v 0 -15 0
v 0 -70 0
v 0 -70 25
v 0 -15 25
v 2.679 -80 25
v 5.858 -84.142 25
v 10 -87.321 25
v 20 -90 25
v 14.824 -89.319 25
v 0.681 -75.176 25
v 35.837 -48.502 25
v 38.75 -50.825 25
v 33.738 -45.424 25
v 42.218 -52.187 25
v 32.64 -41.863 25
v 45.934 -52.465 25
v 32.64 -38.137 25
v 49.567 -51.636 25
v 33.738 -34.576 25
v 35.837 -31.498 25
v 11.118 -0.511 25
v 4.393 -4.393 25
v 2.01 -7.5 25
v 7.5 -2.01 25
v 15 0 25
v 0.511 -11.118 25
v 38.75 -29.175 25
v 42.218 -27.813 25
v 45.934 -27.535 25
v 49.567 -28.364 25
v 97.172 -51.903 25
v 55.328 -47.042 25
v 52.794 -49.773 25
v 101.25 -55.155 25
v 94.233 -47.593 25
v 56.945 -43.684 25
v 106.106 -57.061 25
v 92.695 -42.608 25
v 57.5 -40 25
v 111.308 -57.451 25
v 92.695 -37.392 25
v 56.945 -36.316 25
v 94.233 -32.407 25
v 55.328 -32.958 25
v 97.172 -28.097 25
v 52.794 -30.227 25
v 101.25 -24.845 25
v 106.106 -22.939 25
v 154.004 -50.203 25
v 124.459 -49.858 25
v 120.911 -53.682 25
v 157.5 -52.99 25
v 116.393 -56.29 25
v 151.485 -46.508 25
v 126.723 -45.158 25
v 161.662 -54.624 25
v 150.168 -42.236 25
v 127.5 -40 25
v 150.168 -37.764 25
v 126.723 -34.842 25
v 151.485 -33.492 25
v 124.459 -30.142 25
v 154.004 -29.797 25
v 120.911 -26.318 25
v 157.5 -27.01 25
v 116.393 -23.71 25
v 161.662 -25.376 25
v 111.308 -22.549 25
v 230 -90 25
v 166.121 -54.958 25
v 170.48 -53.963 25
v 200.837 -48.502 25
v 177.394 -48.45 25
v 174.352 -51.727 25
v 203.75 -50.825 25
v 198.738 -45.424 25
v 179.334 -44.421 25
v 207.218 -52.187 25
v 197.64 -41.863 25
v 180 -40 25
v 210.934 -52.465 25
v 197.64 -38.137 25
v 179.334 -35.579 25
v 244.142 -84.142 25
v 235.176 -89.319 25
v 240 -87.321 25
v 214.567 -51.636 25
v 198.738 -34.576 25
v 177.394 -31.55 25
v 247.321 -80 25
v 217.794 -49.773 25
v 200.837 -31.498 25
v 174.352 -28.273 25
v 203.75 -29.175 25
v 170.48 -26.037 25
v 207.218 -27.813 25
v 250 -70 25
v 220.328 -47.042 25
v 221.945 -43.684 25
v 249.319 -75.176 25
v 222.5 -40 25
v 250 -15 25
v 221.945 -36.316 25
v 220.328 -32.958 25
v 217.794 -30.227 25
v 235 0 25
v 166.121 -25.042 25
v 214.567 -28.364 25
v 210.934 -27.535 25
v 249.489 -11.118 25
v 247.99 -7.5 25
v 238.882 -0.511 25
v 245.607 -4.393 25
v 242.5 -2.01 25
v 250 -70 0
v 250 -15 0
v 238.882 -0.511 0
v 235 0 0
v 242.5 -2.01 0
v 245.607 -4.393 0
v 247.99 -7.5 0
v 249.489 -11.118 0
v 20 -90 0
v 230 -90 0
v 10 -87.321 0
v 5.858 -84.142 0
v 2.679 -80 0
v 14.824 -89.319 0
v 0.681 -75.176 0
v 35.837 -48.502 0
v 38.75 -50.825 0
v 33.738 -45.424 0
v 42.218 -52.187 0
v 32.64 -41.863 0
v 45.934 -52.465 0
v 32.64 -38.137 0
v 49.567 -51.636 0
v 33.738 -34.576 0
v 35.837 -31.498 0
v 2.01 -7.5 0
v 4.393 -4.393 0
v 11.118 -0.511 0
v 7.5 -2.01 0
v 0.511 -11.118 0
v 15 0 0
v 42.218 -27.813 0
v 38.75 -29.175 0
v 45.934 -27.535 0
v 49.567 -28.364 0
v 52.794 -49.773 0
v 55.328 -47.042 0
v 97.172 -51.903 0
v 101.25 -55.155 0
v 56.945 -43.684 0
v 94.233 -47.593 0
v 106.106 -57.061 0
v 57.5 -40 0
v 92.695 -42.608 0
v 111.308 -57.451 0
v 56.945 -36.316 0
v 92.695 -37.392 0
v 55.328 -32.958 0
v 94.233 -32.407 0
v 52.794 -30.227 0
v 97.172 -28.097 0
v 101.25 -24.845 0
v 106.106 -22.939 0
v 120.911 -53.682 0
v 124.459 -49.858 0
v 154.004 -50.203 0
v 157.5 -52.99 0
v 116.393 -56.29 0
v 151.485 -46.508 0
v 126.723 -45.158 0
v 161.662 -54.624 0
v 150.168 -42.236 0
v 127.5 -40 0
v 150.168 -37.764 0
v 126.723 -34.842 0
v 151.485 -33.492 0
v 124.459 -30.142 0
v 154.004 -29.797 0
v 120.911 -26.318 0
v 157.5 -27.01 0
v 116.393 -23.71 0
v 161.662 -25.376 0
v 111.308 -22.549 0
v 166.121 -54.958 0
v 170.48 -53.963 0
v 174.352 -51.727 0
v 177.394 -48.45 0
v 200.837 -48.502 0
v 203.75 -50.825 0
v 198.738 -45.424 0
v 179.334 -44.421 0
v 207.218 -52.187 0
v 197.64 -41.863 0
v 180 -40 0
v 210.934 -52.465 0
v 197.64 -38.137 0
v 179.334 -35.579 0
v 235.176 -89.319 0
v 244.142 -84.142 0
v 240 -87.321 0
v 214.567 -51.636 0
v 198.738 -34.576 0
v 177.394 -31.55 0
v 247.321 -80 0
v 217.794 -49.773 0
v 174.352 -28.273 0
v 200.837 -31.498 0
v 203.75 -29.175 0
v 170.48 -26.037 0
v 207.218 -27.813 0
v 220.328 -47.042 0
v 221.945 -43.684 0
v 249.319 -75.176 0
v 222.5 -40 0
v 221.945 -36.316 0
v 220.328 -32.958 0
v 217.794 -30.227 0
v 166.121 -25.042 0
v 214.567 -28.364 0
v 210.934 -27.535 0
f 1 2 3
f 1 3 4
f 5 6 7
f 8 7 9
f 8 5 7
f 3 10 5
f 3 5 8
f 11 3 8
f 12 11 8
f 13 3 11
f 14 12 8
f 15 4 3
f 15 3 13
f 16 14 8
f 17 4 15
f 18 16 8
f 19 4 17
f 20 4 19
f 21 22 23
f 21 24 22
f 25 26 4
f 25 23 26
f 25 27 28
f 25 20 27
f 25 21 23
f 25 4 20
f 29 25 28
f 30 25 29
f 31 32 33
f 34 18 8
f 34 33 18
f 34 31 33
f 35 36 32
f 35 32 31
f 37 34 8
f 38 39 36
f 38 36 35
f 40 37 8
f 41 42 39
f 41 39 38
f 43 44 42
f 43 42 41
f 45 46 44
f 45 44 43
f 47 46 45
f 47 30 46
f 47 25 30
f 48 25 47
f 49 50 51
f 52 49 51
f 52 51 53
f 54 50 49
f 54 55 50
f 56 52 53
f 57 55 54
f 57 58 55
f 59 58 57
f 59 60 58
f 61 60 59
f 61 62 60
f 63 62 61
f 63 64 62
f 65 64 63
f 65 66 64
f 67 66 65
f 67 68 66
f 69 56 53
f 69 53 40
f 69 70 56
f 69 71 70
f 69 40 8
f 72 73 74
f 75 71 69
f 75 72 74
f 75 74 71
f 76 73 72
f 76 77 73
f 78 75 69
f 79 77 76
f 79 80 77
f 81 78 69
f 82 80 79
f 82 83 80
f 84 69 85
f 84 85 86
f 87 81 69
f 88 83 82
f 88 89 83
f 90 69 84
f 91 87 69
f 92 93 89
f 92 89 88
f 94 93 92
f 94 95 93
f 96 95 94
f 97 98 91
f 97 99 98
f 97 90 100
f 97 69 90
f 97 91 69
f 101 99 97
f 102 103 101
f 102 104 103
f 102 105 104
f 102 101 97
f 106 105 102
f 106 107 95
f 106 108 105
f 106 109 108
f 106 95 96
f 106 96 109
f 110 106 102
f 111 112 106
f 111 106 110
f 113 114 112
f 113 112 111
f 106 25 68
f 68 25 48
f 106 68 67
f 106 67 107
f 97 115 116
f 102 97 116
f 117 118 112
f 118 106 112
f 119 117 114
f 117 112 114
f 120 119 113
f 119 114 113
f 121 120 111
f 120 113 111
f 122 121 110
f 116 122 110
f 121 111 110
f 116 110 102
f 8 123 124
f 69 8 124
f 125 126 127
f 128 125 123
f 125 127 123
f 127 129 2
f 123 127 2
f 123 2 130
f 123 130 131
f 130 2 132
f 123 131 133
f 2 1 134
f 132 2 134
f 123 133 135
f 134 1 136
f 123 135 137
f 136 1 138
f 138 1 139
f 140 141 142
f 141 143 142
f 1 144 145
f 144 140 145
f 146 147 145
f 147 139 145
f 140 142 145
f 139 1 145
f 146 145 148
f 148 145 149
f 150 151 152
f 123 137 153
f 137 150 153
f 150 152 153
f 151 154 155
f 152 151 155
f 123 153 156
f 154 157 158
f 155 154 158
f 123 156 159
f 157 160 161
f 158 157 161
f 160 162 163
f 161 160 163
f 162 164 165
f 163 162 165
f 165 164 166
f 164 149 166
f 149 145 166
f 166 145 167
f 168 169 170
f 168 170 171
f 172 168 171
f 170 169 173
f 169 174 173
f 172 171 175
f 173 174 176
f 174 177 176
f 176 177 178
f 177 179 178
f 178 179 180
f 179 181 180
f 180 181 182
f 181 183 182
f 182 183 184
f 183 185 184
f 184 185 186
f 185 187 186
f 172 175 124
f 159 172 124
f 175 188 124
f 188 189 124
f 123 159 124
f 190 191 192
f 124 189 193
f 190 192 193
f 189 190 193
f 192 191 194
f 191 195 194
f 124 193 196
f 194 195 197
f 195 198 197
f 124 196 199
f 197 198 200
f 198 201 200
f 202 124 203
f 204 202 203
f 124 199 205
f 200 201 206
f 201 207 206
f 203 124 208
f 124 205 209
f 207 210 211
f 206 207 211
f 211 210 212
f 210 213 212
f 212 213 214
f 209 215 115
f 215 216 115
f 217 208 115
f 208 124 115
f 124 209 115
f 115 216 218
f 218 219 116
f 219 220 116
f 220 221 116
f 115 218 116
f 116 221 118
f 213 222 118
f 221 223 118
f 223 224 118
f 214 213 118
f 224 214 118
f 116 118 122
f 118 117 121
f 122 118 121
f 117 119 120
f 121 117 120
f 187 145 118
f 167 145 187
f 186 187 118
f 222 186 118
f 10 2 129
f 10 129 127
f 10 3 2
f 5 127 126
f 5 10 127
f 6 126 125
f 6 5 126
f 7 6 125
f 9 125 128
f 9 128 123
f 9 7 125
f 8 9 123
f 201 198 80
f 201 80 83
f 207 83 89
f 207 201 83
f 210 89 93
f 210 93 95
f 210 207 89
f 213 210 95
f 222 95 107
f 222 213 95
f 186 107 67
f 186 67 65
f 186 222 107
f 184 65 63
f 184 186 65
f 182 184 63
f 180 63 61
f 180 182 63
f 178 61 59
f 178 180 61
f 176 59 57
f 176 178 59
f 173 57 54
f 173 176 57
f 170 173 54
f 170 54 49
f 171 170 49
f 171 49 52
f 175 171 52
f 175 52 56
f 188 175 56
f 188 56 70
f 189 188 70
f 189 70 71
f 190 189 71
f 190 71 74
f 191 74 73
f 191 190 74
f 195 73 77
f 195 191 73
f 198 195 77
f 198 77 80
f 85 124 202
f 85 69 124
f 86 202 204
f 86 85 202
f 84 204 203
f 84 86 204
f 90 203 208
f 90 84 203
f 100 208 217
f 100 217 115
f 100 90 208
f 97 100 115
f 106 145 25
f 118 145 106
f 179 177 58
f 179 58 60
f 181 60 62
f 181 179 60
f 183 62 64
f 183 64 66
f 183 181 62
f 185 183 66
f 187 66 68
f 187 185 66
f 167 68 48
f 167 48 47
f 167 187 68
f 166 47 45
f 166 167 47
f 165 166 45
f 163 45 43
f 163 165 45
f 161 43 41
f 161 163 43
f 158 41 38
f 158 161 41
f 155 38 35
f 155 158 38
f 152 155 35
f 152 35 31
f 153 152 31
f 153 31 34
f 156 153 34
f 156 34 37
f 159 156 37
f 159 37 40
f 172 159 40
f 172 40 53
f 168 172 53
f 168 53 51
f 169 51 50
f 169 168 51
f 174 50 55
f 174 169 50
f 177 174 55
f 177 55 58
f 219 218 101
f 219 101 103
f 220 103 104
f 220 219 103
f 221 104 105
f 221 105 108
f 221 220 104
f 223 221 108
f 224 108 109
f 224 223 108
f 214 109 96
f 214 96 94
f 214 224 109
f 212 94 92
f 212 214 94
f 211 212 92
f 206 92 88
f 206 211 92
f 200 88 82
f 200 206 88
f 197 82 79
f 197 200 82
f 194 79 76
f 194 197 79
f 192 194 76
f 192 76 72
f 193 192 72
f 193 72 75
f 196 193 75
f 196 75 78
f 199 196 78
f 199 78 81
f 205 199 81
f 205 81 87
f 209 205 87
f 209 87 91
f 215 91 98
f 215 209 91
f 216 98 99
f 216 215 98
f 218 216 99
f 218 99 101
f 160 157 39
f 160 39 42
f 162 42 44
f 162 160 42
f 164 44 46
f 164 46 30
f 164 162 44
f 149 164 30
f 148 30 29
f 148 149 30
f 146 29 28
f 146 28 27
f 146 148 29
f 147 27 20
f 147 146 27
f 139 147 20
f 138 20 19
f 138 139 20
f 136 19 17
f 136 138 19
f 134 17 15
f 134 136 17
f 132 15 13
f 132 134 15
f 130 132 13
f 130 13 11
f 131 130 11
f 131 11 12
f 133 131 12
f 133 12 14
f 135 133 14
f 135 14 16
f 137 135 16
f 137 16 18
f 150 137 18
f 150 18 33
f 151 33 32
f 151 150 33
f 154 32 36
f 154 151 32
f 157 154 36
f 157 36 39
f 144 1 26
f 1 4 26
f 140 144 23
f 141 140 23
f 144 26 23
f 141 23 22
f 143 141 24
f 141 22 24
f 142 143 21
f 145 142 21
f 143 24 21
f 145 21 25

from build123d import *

# Parameters (mm, degrees)
CROQUIS1_W              = 250
CROQUIS1_H              = 90
CROQUIS1_R              = 12.5
CROQUIS1_R_2            = 17.5
CROQUIS1_R_3            = 15
SALIENTE_EXTRUIR1_DEPTH = 25
REDONDEO1_R             = 15
REDONDEO2_R             = 20


with BuildPart() as part:
    # Croquis1 → Saliente-Extruir1 (new body)
    with BuildSketch(Plane.XY):
        with Locations((125, -45)):
            Rectangle(CROQUIS1_W, CROQUIS1_H)
        with Locations((45, -40)):
            Circle(CROQUIS1_R, mode=Mode.SUBTRACT)
        with Locations((110, -40)):
            Circle(CROQUIS1_R_2, mode=Mode.SUBTRACT)
        with Locations((165, -40)):
            Circle(CROQUIS1_R_3, mode=Mode.SUBTRACT)
        with Locations((210, -40)):
            Circle(CROQUIS1_R, mode=Mode.SUBTRACT)
    extrude(amount=SALIENTE_EXTRUIR1_DEPTH)

    # Redondeo1
    redondeo1_edges = [part.edges().sort_by_distance(p)[0] for p in [
        (0, 0, 12.5),
        (250, 0, 12.5),
    ]]
    fillet(redondeo1_edges, radius=REDONDEO1_R)

    # Redondeo2
    redondeo2_edges = [part.edges().sort_by_distance(p)[0] for p in [
        (250, -90, 12.5),
        (0, -90, 12.5),
    ]]
    fillet(redondeo2_edges, radius=REDONDEO2_R)


solid = part.part
